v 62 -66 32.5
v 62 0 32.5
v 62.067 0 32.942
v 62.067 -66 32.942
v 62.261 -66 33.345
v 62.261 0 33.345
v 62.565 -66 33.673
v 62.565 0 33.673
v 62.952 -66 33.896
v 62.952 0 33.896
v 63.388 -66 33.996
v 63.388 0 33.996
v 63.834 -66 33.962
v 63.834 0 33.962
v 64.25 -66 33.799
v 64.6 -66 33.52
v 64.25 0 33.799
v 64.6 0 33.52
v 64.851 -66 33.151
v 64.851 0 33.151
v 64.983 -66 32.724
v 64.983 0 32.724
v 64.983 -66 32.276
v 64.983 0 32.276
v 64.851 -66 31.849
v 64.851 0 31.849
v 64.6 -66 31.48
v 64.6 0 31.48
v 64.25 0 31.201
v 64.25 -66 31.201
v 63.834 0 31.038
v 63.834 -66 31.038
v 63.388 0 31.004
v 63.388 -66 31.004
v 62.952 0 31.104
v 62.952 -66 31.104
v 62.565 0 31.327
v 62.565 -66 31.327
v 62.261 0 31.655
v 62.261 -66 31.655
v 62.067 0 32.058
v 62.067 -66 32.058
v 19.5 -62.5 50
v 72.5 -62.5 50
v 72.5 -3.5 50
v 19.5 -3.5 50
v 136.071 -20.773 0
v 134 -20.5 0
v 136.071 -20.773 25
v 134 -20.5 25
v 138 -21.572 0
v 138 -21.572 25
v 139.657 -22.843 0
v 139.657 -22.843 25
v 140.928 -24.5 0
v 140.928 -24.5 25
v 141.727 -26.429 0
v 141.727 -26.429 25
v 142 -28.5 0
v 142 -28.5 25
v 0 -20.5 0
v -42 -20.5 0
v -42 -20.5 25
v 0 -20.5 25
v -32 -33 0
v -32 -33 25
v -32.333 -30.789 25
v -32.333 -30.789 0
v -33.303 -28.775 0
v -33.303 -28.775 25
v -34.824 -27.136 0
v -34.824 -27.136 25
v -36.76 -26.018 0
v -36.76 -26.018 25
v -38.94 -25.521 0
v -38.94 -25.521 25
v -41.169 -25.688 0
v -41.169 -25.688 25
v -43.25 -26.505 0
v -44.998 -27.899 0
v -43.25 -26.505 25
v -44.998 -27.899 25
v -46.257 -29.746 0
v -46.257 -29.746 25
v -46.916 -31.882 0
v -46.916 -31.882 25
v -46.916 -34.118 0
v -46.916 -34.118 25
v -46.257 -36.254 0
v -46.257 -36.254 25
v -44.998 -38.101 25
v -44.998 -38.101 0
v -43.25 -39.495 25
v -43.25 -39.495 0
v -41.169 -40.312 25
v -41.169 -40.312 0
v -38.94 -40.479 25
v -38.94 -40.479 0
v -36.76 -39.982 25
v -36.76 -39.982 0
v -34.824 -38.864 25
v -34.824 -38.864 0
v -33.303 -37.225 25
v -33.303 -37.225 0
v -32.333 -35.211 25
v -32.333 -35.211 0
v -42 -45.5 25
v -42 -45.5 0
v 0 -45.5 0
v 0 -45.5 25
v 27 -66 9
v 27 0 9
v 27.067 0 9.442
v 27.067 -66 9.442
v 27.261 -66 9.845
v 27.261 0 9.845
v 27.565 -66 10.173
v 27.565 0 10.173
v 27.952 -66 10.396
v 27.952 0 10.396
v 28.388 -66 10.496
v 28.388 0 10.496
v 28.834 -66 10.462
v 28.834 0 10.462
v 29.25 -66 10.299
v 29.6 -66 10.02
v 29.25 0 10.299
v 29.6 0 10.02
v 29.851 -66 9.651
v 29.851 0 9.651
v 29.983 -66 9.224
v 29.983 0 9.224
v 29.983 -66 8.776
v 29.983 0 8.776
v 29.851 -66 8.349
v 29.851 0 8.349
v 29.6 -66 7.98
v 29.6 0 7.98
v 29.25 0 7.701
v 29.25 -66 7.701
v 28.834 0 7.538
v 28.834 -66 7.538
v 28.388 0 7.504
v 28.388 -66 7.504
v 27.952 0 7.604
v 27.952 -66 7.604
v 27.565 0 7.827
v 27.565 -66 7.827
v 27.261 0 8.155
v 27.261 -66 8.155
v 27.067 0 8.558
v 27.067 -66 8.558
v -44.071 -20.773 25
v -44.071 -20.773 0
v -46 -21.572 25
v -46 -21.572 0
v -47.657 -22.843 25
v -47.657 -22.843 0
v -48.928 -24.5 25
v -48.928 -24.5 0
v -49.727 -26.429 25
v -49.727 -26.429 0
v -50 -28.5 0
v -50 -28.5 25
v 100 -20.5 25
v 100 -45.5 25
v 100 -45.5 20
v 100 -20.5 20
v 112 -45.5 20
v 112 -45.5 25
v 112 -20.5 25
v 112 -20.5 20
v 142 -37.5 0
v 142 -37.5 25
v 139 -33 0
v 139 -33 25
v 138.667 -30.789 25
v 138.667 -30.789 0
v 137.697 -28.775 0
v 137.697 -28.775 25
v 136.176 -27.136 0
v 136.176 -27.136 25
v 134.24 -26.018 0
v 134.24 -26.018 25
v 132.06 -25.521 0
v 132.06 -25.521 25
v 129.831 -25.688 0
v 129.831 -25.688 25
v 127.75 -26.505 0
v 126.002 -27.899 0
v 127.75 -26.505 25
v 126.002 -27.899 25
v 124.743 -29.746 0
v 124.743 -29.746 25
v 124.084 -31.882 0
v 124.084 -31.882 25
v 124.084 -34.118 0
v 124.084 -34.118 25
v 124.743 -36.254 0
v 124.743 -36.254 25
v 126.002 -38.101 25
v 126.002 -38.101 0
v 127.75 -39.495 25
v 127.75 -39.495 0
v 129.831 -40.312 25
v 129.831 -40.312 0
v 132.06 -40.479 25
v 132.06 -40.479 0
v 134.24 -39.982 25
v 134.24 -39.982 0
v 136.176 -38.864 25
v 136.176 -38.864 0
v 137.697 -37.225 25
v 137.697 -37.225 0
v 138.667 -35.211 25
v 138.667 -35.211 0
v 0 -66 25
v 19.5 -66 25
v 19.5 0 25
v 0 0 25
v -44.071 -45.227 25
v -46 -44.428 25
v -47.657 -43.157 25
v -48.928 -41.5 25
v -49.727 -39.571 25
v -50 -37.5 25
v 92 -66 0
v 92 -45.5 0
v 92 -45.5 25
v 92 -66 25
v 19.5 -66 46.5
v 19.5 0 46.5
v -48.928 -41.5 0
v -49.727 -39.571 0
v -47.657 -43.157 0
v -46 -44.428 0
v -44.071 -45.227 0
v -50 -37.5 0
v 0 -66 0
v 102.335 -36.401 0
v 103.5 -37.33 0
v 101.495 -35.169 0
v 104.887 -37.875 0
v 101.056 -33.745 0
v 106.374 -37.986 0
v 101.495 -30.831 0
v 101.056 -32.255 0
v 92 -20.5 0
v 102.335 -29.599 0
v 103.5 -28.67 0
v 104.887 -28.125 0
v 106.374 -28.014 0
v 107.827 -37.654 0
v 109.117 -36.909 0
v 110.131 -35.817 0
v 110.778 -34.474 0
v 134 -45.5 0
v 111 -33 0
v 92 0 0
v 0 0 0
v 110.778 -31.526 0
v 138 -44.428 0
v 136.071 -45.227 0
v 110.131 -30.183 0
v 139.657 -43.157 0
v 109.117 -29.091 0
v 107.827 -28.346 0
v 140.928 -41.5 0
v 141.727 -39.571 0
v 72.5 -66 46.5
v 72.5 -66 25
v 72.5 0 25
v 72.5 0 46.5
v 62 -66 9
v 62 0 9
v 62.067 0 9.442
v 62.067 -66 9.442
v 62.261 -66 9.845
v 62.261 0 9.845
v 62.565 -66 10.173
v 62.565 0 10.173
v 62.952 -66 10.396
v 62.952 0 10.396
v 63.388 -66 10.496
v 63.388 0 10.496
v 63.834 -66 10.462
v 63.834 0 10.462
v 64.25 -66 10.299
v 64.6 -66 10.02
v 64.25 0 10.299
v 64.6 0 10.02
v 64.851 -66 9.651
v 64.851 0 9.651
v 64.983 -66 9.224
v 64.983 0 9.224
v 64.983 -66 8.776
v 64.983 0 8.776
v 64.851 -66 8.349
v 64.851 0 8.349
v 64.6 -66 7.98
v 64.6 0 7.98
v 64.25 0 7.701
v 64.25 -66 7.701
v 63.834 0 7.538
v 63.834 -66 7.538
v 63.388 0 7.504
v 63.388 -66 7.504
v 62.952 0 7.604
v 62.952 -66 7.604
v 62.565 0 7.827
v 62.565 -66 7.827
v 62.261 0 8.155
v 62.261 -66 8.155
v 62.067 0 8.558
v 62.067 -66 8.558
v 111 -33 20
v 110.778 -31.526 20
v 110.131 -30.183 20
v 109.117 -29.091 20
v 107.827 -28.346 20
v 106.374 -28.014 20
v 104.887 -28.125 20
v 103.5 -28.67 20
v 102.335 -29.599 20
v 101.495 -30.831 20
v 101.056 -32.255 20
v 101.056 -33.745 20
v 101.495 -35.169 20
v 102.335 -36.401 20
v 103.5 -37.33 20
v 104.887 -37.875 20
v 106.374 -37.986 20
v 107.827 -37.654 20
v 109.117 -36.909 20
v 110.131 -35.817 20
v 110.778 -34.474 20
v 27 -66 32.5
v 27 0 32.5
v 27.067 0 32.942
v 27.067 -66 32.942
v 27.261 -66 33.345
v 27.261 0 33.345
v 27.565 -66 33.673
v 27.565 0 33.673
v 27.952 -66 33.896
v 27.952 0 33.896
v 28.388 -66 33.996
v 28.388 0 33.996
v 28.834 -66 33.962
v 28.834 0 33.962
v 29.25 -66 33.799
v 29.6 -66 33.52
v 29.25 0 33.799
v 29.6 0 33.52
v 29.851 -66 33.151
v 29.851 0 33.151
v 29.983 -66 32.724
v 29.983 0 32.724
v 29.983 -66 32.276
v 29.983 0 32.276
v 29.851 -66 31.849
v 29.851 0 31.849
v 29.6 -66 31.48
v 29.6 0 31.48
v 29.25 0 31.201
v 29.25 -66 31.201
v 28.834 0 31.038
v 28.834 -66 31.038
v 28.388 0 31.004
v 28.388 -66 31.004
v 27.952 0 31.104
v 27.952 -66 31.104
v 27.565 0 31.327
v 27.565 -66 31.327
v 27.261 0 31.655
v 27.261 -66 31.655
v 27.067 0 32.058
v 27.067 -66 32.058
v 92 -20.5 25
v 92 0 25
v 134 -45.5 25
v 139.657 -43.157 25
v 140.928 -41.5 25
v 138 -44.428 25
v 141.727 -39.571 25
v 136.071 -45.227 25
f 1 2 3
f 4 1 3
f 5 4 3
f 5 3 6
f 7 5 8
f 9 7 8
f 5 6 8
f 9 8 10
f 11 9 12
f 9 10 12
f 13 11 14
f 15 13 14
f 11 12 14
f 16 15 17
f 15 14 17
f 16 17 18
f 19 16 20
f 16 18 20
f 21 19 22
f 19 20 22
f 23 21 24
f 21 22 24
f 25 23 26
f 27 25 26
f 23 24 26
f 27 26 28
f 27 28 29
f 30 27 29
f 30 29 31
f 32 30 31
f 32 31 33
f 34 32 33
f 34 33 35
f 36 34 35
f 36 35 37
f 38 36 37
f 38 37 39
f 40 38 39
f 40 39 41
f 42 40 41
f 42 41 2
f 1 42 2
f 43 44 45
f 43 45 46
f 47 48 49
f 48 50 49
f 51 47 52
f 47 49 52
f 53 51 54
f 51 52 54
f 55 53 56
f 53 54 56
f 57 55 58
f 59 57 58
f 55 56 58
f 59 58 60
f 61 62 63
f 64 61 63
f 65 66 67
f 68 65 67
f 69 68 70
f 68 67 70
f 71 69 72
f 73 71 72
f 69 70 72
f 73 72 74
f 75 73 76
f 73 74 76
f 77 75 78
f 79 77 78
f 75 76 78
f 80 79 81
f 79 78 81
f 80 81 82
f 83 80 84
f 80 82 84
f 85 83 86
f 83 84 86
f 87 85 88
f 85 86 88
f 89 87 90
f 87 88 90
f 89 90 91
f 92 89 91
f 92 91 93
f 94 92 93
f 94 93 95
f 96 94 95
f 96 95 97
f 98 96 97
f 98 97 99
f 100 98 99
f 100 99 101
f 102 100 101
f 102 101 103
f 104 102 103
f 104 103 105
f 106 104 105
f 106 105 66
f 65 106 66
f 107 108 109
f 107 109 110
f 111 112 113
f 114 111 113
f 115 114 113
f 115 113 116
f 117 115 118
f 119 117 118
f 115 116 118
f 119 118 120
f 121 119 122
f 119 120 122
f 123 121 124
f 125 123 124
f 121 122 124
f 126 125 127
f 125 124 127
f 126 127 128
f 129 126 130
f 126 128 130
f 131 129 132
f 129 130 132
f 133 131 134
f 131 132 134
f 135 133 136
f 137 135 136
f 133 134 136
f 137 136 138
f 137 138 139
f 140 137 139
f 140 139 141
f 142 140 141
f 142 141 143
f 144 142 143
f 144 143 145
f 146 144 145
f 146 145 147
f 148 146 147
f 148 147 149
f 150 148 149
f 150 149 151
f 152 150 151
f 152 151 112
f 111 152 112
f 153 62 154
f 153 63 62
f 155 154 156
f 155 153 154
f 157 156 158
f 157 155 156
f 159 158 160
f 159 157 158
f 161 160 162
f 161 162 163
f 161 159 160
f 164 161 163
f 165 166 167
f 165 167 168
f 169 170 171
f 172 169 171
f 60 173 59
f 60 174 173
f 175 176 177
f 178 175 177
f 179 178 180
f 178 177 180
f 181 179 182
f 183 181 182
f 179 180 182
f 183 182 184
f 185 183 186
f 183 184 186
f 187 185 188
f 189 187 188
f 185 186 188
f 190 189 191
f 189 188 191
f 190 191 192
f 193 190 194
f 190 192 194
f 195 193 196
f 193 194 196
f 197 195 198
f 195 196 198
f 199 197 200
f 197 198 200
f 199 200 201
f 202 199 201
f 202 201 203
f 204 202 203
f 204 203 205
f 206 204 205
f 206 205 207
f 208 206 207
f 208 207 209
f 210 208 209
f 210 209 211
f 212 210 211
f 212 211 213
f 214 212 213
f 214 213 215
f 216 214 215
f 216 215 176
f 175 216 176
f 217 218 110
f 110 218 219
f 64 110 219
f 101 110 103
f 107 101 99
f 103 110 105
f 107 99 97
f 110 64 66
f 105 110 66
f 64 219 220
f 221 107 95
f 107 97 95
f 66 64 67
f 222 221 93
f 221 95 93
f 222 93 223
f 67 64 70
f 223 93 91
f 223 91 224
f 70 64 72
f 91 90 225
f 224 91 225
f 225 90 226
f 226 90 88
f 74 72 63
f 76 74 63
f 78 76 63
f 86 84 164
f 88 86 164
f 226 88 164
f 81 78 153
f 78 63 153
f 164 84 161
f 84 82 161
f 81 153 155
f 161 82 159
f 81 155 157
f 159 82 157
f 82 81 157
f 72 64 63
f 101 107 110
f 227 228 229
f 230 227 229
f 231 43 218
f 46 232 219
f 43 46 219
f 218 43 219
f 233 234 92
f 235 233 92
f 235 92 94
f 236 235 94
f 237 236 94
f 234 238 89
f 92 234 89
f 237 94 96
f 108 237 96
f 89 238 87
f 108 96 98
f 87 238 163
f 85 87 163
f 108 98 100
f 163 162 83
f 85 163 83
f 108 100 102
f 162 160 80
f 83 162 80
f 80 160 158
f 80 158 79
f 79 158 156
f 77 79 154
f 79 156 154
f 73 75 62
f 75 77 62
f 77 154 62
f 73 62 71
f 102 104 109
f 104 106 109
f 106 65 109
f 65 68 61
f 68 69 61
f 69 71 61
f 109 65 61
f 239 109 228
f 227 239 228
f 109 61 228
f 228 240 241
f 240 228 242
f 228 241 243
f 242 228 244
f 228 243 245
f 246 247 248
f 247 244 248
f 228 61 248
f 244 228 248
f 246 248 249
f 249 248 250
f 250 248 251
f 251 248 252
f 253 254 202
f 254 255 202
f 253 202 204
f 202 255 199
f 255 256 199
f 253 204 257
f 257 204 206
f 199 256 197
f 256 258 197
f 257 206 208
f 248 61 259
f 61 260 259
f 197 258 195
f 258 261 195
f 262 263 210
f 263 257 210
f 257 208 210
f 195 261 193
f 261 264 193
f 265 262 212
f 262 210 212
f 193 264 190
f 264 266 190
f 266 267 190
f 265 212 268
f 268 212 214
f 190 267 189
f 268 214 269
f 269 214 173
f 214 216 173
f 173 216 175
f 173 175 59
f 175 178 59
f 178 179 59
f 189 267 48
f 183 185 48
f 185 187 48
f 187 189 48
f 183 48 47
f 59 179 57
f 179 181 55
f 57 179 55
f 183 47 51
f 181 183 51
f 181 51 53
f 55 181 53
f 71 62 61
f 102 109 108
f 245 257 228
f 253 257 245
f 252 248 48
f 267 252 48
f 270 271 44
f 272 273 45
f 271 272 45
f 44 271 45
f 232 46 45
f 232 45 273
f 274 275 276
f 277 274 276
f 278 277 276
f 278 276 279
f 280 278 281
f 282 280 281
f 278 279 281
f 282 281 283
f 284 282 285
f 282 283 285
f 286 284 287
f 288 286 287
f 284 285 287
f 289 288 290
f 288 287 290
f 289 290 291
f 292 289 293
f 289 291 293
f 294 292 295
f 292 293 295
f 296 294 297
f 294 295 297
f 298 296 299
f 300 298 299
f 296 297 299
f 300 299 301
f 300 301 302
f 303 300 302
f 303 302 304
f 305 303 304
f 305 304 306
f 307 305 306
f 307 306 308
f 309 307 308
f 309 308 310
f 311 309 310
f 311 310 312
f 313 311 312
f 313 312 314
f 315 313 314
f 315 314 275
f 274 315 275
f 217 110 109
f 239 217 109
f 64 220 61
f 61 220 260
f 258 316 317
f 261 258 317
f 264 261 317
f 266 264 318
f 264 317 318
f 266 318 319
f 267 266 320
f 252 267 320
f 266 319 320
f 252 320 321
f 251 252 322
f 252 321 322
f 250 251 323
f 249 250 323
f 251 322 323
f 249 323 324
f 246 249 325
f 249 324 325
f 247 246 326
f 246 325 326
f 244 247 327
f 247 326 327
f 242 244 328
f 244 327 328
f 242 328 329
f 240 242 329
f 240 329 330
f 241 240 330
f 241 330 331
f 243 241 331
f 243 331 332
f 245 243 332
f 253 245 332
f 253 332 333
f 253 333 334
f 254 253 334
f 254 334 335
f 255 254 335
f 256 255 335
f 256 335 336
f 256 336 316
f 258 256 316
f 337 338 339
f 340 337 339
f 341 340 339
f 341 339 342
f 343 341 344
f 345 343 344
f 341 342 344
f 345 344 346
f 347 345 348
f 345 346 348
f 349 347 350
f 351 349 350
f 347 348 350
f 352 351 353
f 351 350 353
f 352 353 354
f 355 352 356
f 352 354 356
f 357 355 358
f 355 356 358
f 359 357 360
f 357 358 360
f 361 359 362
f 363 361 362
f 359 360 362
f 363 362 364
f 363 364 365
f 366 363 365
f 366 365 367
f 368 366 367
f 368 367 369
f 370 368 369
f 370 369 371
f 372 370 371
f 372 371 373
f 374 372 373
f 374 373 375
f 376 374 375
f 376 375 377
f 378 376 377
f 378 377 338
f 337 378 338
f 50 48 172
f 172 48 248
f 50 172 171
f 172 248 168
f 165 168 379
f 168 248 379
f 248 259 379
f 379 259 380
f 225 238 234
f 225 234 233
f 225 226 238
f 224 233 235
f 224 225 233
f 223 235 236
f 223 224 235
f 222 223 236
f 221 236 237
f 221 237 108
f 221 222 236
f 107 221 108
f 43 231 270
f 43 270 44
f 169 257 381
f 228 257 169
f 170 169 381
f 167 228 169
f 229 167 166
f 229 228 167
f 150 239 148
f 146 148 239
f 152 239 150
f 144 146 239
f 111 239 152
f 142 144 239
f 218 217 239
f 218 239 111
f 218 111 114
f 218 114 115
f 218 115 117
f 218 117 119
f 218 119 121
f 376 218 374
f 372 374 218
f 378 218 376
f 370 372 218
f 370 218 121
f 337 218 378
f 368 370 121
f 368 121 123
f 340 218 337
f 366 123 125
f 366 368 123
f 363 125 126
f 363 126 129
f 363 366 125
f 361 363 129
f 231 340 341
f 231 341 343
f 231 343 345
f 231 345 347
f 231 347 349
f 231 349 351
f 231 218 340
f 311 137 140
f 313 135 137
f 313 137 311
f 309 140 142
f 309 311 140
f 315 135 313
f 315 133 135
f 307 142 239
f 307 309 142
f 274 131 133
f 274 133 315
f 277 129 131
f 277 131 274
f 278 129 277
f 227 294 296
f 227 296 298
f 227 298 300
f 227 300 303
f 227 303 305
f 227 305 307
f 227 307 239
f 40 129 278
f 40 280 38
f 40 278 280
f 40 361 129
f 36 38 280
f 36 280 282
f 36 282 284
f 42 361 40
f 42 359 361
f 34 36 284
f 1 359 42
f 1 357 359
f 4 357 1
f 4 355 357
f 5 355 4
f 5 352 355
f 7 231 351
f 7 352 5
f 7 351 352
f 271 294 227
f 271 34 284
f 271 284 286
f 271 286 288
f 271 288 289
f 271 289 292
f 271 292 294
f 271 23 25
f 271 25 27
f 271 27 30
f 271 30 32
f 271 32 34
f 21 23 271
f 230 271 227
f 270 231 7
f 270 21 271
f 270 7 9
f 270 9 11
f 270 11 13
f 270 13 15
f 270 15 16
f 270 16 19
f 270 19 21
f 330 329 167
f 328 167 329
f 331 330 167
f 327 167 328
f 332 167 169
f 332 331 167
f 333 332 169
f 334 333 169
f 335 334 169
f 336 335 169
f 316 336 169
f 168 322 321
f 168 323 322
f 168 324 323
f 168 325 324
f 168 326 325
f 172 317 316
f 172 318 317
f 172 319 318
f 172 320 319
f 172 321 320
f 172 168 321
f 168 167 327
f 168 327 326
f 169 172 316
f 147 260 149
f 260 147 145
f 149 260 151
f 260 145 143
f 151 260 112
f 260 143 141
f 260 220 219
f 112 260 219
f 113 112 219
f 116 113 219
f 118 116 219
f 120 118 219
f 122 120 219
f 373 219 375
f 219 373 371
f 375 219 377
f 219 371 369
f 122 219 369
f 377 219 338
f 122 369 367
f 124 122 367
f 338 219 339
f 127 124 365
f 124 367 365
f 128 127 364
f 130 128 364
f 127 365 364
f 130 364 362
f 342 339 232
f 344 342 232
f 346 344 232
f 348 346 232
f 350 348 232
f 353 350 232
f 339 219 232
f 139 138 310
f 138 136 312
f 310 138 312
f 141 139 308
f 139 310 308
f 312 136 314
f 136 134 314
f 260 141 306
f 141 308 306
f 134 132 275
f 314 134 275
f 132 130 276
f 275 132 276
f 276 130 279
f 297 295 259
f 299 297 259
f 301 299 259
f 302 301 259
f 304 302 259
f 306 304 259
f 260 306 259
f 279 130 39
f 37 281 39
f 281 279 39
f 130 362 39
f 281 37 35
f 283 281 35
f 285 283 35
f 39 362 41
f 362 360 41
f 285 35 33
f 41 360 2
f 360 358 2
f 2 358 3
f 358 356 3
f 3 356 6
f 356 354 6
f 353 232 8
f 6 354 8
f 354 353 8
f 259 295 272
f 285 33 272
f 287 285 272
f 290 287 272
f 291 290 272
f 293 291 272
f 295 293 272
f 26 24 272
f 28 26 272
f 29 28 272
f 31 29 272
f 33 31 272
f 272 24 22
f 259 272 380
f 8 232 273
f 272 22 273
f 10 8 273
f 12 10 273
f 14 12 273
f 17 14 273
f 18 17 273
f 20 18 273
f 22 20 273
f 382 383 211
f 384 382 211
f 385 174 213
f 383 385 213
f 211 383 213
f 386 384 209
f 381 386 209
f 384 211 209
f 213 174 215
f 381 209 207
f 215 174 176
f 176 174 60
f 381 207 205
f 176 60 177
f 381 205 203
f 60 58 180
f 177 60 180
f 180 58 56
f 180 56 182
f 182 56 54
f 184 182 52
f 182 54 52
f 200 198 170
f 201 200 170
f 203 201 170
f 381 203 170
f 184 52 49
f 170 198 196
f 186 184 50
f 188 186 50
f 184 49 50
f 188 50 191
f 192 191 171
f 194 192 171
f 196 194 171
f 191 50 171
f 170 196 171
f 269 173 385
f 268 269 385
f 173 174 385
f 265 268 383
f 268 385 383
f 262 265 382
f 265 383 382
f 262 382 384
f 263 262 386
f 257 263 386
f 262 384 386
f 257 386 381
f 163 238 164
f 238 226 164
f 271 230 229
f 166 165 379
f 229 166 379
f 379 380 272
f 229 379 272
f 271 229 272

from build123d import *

# Parameters (mm, degrees)
F1_DEPTH      = 66
F3_DEPTH      = 72.501
F4_W          = 25
F4_H          = 25
F5_DEPTH      = 50
F5_DEPTH_BACK = 142
F6_R          = 7.5
F7_DEPTH      = 25.001
F8_R          = 5
F9_DEPTH      = 25
F10_R         = 8
F11_W         = 12
F11_H         = 25
F12_DEPTH     = 5
F14_D         = 3


with BuildPart() as f1:
    # F0 (on Front) → F1 (new body)
    with BuildSketch(Plane.XZ):
        Polygon((0, 25), (0, 0), (92, 0), (92, 25), (72.5, 25), (72.5, 50), (19.5, 50), (19.5, 25), align=None)
    extrude(amount=F1_DEPTH)

    # F2 (on face) → F3 (cut, through all)
    with BuildSketch(Plane.YZ.offset(72.5)):
        Polygon((-62.5, 50), (-66, 50), (-66, 46.5), align=None)
        Polygon((0, 46.5), (0, 50), (-3.5, 50), align=None)
    extrude(amount=-F3_DEPTH, mode=Mode.SUBTRACT)

    # F4 (on face) → F5 (join, two sides)
    with BuildSketch(Plane.YZ.offset(92)) as f5_sk:
        with Locations((-33, 12.5)):
            Rectangle(F4_W, F4_H)
    extrude(amount=F5_DEPTH)
    extrude(f5_sk.sketch, amount=-F5_DEPTH_BACK)

    # F6 (on face) → F7 (cut, through all)
    with BuildSketch(Plane.XY.offset(25)):
        with Locations((131.5, -33)):
            Circle(F6_R)
        with Locations((-39.5, -33)):
            Circle(F6_R)
    extrude(amount=-F7_DEPTH, mode=Mode.SUBTRACT)

    # F8 (on face) → F9 (cut)
    with BuildSketch(Plane.XY.offset(25)):
        with Locations((106, -33)):
            Circle(F8_R)
    extrude(amount=-F9_DEPTH, mode=Mode.SUBTRACT)

    # F10
    f10_edges = [f1.edges().sort_by_distance(p)[0] for p in [
        (142, -20.5, 12.5),
        (142, -45.5, 12.5),
        (-50, -45.5, 12.5),
        (-50, -20.5, 12.5),
    ]]
    fillet(f10_edges, radius=F10_R)

    # F11 (on face) → F12 (cut)
    with BuildSketch(Plane.XY.offset(25)):
        with Locations((106, -33)):
            Rectangle(F11_W, F11_H)
    extrude(amount=-F12_DEPTH, mode=Mode.SUBTRACT)

    # F14 (through all)
    with Locations(Plane.XZ.offset(66)):
        with Locations((28.5, 32.5), (63.5, 32.5), (63.5, 9), (28.5, 9)):
            Hole(F14_D / 2)


solid = f1.part
